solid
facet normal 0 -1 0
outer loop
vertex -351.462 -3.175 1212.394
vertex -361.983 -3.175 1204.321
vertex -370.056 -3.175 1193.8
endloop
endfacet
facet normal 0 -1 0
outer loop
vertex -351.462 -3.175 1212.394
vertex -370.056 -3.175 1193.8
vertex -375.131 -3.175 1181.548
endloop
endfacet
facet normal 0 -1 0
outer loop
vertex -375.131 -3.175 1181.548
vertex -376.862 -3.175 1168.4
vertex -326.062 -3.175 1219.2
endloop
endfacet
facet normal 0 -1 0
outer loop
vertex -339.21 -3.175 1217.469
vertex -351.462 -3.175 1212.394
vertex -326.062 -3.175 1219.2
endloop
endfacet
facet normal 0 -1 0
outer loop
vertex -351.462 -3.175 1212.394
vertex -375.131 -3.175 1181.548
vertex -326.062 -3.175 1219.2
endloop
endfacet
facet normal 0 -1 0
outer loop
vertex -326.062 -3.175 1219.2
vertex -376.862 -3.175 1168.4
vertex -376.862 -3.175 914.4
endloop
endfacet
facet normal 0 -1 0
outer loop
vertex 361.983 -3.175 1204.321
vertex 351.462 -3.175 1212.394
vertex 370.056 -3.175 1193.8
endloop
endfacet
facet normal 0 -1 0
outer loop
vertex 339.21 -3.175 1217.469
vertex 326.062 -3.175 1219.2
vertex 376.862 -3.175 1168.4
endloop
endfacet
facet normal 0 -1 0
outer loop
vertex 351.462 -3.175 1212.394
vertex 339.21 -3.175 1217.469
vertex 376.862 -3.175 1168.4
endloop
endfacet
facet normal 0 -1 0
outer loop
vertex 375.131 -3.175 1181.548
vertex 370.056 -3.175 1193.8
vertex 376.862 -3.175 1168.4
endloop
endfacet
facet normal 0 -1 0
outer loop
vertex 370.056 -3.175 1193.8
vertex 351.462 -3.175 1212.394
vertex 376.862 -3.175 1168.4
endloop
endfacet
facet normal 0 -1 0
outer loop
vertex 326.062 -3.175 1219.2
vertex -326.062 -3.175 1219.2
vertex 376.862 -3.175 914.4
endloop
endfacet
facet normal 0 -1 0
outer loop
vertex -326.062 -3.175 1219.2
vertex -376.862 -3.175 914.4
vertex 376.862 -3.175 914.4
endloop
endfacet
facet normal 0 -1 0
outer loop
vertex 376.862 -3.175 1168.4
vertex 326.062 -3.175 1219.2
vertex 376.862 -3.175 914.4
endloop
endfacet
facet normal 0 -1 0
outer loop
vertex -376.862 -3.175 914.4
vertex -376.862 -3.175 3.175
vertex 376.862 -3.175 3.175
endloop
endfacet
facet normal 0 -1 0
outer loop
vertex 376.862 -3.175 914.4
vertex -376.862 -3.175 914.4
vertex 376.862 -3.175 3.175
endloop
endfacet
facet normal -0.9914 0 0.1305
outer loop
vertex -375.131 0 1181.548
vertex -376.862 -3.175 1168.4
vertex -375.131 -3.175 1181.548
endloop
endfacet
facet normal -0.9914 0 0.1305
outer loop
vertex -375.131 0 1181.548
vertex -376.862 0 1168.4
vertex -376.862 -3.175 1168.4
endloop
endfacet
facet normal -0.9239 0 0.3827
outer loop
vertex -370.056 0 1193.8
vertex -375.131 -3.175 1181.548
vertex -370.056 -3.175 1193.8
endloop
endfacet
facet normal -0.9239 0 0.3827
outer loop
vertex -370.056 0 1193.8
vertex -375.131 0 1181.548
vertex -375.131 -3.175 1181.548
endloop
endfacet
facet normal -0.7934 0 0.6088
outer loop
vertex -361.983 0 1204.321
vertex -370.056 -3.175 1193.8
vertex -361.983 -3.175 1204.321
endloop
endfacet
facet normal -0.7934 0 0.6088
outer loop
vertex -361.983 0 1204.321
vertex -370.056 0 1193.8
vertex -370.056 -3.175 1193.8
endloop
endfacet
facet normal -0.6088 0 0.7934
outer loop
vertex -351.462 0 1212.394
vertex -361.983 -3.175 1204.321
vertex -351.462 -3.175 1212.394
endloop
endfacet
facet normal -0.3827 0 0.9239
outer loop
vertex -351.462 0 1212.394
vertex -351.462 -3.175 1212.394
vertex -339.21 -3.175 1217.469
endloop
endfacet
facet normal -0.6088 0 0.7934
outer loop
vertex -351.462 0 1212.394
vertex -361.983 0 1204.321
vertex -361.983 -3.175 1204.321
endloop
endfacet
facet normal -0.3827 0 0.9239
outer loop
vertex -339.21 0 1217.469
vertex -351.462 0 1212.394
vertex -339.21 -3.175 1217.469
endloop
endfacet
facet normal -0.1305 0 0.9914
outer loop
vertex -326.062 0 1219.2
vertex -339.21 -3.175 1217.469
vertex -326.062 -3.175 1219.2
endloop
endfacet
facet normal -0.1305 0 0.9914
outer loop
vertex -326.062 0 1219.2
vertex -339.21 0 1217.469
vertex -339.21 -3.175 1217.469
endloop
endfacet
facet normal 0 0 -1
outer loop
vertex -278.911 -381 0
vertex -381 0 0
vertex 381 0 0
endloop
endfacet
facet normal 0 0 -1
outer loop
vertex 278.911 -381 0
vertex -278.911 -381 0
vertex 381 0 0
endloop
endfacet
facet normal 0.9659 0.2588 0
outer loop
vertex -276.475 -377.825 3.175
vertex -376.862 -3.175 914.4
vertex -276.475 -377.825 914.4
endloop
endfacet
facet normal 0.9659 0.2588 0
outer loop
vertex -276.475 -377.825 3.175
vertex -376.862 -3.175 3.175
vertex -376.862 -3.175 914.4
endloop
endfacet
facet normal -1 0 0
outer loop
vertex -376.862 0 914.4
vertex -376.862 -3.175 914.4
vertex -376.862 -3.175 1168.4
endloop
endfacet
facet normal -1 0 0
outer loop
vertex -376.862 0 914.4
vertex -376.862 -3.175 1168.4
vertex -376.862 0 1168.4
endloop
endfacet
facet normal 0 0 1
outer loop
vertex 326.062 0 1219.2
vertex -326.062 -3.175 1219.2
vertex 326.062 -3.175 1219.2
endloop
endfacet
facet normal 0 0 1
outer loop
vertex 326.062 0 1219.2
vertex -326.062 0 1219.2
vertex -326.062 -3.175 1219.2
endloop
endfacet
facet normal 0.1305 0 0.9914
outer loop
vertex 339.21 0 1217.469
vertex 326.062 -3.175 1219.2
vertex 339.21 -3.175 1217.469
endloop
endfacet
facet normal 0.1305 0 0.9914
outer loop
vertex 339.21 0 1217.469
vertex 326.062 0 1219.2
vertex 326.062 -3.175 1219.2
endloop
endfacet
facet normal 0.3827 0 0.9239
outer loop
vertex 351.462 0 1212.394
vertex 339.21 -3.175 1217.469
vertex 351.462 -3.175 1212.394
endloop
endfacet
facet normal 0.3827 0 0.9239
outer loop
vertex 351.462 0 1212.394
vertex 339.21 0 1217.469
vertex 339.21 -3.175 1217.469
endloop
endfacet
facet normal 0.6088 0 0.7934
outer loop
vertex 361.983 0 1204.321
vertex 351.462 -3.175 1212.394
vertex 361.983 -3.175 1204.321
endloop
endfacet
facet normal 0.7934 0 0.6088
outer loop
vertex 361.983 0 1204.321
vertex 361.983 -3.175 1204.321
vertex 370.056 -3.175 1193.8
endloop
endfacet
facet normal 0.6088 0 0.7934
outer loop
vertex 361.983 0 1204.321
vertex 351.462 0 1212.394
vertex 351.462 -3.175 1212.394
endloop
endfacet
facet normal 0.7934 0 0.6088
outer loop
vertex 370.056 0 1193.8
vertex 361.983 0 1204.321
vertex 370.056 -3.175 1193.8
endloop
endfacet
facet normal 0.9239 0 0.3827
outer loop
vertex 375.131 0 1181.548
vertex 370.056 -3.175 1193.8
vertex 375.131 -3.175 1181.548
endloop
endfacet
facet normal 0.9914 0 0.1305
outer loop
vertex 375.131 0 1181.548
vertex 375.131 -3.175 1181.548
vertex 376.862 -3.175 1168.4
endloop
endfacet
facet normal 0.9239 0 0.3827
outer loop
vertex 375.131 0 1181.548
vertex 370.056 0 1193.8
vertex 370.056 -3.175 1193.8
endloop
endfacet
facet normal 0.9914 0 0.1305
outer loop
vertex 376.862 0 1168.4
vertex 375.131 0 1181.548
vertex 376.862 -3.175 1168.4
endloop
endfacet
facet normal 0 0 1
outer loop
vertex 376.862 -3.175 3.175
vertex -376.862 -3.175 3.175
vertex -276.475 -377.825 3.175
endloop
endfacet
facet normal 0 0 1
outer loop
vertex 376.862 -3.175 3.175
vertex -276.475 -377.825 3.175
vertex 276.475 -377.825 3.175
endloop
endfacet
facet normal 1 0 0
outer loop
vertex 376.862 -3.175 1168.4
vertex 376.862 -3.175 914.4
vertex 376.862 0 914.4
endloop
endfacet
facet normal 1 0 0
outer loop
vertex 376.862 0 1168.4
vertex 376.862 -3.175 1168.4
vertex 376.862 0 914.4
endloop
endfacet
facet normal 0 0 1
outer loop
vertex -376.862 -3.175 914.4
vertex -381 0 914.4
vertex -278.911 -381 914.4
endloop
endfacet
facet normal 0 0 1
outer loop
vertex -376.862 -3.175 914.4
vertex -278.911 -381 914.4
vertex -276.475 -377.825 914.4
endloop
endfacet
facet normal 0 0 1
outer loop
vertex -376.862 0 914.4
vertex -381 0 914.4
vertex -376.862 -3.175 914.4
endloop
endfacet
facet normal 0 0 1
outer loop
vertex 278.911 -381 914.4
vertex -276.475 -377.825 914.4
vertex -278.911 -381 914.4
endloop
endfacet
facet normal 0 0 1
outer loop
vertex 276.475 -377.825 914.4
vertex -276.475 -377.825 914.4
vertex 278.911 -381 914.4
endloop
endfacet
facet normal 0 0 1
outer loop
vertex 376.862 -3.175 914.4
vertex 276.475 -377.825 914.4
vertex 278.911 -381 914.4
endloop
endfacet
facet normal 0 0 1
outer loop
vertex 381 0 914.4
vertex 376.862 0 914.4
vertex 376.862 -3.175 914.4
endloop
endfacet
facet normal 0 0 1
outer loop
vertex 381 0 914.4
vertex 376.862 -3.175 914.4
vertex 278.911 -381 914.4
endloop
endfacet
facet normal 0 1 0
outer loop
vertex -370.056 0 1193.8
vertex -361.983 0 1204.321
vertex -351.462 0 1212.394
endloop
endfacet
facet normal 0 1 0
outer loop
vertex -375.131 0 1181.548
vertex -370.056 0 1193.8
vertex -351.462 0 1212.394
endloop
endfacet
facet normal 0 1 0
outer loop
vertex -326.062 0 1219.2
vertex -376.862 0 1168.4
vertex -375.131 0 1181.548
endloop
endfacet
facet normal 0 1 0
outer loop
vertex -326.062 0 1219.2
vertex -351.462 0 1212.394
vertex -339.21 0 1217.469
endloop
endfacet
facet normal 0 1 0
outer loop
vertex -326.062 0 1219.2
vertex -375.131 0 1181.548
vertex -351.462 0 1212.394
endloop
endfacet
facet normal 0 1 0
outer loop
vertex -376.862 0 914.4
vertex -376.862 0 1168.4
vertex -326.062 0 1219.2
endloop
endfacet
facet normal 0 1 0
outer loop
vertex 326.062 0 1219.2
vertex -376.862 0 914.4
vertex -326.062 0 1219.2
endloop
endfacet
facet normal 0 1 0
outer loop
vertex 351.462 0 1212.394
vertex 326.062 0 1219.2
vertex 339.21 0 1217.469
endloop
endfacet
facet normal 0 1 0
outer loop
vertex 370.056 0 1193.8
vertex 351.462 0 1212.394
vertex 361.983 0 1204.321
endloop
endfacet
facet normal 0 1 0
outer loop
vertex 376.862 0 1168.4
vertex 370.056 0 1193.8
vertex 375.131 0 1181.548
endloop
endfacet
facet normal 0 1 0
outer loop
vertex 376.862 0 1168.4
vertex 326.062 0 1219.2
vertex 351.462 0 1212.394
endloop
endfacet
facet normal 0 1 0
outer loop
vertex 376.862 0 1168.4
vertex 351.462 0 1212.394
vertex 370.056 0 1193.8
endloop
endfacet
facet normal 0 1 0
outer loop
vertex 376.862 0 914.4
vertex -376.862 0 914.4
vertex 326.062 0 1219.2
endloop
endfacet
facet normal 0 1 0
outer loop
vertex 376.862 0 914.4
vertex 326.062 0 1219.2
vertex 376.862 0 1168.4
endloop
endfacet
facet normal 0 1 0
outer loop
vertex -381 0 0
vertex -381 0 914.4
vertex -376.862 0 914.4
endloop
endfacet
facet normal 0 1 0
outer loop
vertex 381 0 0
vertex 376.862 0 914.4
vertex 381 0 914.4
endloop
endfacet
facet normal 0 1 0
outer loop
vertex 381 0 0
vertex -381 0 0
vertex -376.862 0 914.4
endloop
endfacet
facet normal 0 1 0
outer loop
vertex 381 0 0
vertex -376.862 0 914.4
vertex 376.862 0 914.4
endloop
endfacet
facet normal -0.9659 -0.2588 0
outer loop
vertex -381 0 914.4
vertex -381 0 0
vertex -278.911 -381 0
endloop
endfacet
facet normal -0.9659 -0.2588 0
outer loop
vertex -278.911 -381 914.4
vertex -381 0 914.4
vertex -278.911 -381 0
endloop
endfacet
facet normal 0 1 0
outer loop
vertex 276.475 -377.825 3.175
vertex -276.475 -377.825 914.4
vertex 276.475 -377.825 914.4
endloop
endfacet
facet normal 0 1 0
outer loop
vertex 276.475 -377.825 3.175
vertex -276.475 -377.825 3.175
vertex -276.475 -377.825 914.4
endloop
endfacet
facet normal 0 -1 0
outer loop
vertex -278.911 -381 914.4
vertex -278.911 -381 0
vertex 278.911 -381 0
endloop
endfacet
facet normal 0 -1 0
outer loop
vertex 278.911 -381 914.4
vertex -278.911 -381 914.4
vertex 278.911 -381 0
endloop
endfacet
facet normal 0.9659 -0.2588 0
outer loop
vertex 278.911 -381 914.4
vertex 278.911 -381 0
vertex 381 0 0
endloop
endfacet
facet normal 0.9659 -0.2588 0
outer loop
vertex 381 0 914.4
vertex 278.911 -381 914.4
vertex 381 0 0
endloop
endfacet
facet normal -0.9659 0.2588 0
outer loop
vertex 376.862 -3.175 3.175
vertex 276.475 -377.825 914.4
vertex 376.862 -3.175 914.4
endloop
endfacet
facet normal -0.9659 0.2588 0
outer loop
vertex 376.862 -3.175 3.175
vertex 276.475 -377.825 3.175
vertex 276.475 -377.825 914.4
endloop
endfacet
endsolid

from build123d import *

# Parameters (mm, degrees)
F1_DEPTH = 914.4
F2_T     = -3.175
F3_W     = 753.724518
F3_H     = 3.175
F4_DEPTH = 304.8
F5_R     = 50.8


with BuildPart() as f1:
    # F0 (on Top) → F1 (new body)
    with BuildSketch(Plane.XY):
        Polygon((278.911358, -381), (381, 0), (-381, 0), (-278.911358, -381), align=None)
    extrude(amount=F1_DEPTH)

    # F2
    f2_openings = [f1.faces().sort_by_distance(p)[0] for p in [
        (0, -180.676516, 914.4),
    ]]
    offset(amount=F2_T, openings=f2_openings)

    # F3 (on face) → F4 (join)
    with BuildSketch(Plane.XY.offset(914.4)):
        with Locations((0, -1.5875)):
            Rectangle(F3_W, F3_H)
    extrude(amount=F4_DEPTH)

    # F5
    f5_edges = [f1.edges().sort_by_distance(p)[0] for p in [
        (376.862259, -1.5875, 1219.2),
        (-376.862259, -1.5875, 1219.2),
    ]]
    fillet(f5_edges, radius=F5_R)


solid = f1.part
